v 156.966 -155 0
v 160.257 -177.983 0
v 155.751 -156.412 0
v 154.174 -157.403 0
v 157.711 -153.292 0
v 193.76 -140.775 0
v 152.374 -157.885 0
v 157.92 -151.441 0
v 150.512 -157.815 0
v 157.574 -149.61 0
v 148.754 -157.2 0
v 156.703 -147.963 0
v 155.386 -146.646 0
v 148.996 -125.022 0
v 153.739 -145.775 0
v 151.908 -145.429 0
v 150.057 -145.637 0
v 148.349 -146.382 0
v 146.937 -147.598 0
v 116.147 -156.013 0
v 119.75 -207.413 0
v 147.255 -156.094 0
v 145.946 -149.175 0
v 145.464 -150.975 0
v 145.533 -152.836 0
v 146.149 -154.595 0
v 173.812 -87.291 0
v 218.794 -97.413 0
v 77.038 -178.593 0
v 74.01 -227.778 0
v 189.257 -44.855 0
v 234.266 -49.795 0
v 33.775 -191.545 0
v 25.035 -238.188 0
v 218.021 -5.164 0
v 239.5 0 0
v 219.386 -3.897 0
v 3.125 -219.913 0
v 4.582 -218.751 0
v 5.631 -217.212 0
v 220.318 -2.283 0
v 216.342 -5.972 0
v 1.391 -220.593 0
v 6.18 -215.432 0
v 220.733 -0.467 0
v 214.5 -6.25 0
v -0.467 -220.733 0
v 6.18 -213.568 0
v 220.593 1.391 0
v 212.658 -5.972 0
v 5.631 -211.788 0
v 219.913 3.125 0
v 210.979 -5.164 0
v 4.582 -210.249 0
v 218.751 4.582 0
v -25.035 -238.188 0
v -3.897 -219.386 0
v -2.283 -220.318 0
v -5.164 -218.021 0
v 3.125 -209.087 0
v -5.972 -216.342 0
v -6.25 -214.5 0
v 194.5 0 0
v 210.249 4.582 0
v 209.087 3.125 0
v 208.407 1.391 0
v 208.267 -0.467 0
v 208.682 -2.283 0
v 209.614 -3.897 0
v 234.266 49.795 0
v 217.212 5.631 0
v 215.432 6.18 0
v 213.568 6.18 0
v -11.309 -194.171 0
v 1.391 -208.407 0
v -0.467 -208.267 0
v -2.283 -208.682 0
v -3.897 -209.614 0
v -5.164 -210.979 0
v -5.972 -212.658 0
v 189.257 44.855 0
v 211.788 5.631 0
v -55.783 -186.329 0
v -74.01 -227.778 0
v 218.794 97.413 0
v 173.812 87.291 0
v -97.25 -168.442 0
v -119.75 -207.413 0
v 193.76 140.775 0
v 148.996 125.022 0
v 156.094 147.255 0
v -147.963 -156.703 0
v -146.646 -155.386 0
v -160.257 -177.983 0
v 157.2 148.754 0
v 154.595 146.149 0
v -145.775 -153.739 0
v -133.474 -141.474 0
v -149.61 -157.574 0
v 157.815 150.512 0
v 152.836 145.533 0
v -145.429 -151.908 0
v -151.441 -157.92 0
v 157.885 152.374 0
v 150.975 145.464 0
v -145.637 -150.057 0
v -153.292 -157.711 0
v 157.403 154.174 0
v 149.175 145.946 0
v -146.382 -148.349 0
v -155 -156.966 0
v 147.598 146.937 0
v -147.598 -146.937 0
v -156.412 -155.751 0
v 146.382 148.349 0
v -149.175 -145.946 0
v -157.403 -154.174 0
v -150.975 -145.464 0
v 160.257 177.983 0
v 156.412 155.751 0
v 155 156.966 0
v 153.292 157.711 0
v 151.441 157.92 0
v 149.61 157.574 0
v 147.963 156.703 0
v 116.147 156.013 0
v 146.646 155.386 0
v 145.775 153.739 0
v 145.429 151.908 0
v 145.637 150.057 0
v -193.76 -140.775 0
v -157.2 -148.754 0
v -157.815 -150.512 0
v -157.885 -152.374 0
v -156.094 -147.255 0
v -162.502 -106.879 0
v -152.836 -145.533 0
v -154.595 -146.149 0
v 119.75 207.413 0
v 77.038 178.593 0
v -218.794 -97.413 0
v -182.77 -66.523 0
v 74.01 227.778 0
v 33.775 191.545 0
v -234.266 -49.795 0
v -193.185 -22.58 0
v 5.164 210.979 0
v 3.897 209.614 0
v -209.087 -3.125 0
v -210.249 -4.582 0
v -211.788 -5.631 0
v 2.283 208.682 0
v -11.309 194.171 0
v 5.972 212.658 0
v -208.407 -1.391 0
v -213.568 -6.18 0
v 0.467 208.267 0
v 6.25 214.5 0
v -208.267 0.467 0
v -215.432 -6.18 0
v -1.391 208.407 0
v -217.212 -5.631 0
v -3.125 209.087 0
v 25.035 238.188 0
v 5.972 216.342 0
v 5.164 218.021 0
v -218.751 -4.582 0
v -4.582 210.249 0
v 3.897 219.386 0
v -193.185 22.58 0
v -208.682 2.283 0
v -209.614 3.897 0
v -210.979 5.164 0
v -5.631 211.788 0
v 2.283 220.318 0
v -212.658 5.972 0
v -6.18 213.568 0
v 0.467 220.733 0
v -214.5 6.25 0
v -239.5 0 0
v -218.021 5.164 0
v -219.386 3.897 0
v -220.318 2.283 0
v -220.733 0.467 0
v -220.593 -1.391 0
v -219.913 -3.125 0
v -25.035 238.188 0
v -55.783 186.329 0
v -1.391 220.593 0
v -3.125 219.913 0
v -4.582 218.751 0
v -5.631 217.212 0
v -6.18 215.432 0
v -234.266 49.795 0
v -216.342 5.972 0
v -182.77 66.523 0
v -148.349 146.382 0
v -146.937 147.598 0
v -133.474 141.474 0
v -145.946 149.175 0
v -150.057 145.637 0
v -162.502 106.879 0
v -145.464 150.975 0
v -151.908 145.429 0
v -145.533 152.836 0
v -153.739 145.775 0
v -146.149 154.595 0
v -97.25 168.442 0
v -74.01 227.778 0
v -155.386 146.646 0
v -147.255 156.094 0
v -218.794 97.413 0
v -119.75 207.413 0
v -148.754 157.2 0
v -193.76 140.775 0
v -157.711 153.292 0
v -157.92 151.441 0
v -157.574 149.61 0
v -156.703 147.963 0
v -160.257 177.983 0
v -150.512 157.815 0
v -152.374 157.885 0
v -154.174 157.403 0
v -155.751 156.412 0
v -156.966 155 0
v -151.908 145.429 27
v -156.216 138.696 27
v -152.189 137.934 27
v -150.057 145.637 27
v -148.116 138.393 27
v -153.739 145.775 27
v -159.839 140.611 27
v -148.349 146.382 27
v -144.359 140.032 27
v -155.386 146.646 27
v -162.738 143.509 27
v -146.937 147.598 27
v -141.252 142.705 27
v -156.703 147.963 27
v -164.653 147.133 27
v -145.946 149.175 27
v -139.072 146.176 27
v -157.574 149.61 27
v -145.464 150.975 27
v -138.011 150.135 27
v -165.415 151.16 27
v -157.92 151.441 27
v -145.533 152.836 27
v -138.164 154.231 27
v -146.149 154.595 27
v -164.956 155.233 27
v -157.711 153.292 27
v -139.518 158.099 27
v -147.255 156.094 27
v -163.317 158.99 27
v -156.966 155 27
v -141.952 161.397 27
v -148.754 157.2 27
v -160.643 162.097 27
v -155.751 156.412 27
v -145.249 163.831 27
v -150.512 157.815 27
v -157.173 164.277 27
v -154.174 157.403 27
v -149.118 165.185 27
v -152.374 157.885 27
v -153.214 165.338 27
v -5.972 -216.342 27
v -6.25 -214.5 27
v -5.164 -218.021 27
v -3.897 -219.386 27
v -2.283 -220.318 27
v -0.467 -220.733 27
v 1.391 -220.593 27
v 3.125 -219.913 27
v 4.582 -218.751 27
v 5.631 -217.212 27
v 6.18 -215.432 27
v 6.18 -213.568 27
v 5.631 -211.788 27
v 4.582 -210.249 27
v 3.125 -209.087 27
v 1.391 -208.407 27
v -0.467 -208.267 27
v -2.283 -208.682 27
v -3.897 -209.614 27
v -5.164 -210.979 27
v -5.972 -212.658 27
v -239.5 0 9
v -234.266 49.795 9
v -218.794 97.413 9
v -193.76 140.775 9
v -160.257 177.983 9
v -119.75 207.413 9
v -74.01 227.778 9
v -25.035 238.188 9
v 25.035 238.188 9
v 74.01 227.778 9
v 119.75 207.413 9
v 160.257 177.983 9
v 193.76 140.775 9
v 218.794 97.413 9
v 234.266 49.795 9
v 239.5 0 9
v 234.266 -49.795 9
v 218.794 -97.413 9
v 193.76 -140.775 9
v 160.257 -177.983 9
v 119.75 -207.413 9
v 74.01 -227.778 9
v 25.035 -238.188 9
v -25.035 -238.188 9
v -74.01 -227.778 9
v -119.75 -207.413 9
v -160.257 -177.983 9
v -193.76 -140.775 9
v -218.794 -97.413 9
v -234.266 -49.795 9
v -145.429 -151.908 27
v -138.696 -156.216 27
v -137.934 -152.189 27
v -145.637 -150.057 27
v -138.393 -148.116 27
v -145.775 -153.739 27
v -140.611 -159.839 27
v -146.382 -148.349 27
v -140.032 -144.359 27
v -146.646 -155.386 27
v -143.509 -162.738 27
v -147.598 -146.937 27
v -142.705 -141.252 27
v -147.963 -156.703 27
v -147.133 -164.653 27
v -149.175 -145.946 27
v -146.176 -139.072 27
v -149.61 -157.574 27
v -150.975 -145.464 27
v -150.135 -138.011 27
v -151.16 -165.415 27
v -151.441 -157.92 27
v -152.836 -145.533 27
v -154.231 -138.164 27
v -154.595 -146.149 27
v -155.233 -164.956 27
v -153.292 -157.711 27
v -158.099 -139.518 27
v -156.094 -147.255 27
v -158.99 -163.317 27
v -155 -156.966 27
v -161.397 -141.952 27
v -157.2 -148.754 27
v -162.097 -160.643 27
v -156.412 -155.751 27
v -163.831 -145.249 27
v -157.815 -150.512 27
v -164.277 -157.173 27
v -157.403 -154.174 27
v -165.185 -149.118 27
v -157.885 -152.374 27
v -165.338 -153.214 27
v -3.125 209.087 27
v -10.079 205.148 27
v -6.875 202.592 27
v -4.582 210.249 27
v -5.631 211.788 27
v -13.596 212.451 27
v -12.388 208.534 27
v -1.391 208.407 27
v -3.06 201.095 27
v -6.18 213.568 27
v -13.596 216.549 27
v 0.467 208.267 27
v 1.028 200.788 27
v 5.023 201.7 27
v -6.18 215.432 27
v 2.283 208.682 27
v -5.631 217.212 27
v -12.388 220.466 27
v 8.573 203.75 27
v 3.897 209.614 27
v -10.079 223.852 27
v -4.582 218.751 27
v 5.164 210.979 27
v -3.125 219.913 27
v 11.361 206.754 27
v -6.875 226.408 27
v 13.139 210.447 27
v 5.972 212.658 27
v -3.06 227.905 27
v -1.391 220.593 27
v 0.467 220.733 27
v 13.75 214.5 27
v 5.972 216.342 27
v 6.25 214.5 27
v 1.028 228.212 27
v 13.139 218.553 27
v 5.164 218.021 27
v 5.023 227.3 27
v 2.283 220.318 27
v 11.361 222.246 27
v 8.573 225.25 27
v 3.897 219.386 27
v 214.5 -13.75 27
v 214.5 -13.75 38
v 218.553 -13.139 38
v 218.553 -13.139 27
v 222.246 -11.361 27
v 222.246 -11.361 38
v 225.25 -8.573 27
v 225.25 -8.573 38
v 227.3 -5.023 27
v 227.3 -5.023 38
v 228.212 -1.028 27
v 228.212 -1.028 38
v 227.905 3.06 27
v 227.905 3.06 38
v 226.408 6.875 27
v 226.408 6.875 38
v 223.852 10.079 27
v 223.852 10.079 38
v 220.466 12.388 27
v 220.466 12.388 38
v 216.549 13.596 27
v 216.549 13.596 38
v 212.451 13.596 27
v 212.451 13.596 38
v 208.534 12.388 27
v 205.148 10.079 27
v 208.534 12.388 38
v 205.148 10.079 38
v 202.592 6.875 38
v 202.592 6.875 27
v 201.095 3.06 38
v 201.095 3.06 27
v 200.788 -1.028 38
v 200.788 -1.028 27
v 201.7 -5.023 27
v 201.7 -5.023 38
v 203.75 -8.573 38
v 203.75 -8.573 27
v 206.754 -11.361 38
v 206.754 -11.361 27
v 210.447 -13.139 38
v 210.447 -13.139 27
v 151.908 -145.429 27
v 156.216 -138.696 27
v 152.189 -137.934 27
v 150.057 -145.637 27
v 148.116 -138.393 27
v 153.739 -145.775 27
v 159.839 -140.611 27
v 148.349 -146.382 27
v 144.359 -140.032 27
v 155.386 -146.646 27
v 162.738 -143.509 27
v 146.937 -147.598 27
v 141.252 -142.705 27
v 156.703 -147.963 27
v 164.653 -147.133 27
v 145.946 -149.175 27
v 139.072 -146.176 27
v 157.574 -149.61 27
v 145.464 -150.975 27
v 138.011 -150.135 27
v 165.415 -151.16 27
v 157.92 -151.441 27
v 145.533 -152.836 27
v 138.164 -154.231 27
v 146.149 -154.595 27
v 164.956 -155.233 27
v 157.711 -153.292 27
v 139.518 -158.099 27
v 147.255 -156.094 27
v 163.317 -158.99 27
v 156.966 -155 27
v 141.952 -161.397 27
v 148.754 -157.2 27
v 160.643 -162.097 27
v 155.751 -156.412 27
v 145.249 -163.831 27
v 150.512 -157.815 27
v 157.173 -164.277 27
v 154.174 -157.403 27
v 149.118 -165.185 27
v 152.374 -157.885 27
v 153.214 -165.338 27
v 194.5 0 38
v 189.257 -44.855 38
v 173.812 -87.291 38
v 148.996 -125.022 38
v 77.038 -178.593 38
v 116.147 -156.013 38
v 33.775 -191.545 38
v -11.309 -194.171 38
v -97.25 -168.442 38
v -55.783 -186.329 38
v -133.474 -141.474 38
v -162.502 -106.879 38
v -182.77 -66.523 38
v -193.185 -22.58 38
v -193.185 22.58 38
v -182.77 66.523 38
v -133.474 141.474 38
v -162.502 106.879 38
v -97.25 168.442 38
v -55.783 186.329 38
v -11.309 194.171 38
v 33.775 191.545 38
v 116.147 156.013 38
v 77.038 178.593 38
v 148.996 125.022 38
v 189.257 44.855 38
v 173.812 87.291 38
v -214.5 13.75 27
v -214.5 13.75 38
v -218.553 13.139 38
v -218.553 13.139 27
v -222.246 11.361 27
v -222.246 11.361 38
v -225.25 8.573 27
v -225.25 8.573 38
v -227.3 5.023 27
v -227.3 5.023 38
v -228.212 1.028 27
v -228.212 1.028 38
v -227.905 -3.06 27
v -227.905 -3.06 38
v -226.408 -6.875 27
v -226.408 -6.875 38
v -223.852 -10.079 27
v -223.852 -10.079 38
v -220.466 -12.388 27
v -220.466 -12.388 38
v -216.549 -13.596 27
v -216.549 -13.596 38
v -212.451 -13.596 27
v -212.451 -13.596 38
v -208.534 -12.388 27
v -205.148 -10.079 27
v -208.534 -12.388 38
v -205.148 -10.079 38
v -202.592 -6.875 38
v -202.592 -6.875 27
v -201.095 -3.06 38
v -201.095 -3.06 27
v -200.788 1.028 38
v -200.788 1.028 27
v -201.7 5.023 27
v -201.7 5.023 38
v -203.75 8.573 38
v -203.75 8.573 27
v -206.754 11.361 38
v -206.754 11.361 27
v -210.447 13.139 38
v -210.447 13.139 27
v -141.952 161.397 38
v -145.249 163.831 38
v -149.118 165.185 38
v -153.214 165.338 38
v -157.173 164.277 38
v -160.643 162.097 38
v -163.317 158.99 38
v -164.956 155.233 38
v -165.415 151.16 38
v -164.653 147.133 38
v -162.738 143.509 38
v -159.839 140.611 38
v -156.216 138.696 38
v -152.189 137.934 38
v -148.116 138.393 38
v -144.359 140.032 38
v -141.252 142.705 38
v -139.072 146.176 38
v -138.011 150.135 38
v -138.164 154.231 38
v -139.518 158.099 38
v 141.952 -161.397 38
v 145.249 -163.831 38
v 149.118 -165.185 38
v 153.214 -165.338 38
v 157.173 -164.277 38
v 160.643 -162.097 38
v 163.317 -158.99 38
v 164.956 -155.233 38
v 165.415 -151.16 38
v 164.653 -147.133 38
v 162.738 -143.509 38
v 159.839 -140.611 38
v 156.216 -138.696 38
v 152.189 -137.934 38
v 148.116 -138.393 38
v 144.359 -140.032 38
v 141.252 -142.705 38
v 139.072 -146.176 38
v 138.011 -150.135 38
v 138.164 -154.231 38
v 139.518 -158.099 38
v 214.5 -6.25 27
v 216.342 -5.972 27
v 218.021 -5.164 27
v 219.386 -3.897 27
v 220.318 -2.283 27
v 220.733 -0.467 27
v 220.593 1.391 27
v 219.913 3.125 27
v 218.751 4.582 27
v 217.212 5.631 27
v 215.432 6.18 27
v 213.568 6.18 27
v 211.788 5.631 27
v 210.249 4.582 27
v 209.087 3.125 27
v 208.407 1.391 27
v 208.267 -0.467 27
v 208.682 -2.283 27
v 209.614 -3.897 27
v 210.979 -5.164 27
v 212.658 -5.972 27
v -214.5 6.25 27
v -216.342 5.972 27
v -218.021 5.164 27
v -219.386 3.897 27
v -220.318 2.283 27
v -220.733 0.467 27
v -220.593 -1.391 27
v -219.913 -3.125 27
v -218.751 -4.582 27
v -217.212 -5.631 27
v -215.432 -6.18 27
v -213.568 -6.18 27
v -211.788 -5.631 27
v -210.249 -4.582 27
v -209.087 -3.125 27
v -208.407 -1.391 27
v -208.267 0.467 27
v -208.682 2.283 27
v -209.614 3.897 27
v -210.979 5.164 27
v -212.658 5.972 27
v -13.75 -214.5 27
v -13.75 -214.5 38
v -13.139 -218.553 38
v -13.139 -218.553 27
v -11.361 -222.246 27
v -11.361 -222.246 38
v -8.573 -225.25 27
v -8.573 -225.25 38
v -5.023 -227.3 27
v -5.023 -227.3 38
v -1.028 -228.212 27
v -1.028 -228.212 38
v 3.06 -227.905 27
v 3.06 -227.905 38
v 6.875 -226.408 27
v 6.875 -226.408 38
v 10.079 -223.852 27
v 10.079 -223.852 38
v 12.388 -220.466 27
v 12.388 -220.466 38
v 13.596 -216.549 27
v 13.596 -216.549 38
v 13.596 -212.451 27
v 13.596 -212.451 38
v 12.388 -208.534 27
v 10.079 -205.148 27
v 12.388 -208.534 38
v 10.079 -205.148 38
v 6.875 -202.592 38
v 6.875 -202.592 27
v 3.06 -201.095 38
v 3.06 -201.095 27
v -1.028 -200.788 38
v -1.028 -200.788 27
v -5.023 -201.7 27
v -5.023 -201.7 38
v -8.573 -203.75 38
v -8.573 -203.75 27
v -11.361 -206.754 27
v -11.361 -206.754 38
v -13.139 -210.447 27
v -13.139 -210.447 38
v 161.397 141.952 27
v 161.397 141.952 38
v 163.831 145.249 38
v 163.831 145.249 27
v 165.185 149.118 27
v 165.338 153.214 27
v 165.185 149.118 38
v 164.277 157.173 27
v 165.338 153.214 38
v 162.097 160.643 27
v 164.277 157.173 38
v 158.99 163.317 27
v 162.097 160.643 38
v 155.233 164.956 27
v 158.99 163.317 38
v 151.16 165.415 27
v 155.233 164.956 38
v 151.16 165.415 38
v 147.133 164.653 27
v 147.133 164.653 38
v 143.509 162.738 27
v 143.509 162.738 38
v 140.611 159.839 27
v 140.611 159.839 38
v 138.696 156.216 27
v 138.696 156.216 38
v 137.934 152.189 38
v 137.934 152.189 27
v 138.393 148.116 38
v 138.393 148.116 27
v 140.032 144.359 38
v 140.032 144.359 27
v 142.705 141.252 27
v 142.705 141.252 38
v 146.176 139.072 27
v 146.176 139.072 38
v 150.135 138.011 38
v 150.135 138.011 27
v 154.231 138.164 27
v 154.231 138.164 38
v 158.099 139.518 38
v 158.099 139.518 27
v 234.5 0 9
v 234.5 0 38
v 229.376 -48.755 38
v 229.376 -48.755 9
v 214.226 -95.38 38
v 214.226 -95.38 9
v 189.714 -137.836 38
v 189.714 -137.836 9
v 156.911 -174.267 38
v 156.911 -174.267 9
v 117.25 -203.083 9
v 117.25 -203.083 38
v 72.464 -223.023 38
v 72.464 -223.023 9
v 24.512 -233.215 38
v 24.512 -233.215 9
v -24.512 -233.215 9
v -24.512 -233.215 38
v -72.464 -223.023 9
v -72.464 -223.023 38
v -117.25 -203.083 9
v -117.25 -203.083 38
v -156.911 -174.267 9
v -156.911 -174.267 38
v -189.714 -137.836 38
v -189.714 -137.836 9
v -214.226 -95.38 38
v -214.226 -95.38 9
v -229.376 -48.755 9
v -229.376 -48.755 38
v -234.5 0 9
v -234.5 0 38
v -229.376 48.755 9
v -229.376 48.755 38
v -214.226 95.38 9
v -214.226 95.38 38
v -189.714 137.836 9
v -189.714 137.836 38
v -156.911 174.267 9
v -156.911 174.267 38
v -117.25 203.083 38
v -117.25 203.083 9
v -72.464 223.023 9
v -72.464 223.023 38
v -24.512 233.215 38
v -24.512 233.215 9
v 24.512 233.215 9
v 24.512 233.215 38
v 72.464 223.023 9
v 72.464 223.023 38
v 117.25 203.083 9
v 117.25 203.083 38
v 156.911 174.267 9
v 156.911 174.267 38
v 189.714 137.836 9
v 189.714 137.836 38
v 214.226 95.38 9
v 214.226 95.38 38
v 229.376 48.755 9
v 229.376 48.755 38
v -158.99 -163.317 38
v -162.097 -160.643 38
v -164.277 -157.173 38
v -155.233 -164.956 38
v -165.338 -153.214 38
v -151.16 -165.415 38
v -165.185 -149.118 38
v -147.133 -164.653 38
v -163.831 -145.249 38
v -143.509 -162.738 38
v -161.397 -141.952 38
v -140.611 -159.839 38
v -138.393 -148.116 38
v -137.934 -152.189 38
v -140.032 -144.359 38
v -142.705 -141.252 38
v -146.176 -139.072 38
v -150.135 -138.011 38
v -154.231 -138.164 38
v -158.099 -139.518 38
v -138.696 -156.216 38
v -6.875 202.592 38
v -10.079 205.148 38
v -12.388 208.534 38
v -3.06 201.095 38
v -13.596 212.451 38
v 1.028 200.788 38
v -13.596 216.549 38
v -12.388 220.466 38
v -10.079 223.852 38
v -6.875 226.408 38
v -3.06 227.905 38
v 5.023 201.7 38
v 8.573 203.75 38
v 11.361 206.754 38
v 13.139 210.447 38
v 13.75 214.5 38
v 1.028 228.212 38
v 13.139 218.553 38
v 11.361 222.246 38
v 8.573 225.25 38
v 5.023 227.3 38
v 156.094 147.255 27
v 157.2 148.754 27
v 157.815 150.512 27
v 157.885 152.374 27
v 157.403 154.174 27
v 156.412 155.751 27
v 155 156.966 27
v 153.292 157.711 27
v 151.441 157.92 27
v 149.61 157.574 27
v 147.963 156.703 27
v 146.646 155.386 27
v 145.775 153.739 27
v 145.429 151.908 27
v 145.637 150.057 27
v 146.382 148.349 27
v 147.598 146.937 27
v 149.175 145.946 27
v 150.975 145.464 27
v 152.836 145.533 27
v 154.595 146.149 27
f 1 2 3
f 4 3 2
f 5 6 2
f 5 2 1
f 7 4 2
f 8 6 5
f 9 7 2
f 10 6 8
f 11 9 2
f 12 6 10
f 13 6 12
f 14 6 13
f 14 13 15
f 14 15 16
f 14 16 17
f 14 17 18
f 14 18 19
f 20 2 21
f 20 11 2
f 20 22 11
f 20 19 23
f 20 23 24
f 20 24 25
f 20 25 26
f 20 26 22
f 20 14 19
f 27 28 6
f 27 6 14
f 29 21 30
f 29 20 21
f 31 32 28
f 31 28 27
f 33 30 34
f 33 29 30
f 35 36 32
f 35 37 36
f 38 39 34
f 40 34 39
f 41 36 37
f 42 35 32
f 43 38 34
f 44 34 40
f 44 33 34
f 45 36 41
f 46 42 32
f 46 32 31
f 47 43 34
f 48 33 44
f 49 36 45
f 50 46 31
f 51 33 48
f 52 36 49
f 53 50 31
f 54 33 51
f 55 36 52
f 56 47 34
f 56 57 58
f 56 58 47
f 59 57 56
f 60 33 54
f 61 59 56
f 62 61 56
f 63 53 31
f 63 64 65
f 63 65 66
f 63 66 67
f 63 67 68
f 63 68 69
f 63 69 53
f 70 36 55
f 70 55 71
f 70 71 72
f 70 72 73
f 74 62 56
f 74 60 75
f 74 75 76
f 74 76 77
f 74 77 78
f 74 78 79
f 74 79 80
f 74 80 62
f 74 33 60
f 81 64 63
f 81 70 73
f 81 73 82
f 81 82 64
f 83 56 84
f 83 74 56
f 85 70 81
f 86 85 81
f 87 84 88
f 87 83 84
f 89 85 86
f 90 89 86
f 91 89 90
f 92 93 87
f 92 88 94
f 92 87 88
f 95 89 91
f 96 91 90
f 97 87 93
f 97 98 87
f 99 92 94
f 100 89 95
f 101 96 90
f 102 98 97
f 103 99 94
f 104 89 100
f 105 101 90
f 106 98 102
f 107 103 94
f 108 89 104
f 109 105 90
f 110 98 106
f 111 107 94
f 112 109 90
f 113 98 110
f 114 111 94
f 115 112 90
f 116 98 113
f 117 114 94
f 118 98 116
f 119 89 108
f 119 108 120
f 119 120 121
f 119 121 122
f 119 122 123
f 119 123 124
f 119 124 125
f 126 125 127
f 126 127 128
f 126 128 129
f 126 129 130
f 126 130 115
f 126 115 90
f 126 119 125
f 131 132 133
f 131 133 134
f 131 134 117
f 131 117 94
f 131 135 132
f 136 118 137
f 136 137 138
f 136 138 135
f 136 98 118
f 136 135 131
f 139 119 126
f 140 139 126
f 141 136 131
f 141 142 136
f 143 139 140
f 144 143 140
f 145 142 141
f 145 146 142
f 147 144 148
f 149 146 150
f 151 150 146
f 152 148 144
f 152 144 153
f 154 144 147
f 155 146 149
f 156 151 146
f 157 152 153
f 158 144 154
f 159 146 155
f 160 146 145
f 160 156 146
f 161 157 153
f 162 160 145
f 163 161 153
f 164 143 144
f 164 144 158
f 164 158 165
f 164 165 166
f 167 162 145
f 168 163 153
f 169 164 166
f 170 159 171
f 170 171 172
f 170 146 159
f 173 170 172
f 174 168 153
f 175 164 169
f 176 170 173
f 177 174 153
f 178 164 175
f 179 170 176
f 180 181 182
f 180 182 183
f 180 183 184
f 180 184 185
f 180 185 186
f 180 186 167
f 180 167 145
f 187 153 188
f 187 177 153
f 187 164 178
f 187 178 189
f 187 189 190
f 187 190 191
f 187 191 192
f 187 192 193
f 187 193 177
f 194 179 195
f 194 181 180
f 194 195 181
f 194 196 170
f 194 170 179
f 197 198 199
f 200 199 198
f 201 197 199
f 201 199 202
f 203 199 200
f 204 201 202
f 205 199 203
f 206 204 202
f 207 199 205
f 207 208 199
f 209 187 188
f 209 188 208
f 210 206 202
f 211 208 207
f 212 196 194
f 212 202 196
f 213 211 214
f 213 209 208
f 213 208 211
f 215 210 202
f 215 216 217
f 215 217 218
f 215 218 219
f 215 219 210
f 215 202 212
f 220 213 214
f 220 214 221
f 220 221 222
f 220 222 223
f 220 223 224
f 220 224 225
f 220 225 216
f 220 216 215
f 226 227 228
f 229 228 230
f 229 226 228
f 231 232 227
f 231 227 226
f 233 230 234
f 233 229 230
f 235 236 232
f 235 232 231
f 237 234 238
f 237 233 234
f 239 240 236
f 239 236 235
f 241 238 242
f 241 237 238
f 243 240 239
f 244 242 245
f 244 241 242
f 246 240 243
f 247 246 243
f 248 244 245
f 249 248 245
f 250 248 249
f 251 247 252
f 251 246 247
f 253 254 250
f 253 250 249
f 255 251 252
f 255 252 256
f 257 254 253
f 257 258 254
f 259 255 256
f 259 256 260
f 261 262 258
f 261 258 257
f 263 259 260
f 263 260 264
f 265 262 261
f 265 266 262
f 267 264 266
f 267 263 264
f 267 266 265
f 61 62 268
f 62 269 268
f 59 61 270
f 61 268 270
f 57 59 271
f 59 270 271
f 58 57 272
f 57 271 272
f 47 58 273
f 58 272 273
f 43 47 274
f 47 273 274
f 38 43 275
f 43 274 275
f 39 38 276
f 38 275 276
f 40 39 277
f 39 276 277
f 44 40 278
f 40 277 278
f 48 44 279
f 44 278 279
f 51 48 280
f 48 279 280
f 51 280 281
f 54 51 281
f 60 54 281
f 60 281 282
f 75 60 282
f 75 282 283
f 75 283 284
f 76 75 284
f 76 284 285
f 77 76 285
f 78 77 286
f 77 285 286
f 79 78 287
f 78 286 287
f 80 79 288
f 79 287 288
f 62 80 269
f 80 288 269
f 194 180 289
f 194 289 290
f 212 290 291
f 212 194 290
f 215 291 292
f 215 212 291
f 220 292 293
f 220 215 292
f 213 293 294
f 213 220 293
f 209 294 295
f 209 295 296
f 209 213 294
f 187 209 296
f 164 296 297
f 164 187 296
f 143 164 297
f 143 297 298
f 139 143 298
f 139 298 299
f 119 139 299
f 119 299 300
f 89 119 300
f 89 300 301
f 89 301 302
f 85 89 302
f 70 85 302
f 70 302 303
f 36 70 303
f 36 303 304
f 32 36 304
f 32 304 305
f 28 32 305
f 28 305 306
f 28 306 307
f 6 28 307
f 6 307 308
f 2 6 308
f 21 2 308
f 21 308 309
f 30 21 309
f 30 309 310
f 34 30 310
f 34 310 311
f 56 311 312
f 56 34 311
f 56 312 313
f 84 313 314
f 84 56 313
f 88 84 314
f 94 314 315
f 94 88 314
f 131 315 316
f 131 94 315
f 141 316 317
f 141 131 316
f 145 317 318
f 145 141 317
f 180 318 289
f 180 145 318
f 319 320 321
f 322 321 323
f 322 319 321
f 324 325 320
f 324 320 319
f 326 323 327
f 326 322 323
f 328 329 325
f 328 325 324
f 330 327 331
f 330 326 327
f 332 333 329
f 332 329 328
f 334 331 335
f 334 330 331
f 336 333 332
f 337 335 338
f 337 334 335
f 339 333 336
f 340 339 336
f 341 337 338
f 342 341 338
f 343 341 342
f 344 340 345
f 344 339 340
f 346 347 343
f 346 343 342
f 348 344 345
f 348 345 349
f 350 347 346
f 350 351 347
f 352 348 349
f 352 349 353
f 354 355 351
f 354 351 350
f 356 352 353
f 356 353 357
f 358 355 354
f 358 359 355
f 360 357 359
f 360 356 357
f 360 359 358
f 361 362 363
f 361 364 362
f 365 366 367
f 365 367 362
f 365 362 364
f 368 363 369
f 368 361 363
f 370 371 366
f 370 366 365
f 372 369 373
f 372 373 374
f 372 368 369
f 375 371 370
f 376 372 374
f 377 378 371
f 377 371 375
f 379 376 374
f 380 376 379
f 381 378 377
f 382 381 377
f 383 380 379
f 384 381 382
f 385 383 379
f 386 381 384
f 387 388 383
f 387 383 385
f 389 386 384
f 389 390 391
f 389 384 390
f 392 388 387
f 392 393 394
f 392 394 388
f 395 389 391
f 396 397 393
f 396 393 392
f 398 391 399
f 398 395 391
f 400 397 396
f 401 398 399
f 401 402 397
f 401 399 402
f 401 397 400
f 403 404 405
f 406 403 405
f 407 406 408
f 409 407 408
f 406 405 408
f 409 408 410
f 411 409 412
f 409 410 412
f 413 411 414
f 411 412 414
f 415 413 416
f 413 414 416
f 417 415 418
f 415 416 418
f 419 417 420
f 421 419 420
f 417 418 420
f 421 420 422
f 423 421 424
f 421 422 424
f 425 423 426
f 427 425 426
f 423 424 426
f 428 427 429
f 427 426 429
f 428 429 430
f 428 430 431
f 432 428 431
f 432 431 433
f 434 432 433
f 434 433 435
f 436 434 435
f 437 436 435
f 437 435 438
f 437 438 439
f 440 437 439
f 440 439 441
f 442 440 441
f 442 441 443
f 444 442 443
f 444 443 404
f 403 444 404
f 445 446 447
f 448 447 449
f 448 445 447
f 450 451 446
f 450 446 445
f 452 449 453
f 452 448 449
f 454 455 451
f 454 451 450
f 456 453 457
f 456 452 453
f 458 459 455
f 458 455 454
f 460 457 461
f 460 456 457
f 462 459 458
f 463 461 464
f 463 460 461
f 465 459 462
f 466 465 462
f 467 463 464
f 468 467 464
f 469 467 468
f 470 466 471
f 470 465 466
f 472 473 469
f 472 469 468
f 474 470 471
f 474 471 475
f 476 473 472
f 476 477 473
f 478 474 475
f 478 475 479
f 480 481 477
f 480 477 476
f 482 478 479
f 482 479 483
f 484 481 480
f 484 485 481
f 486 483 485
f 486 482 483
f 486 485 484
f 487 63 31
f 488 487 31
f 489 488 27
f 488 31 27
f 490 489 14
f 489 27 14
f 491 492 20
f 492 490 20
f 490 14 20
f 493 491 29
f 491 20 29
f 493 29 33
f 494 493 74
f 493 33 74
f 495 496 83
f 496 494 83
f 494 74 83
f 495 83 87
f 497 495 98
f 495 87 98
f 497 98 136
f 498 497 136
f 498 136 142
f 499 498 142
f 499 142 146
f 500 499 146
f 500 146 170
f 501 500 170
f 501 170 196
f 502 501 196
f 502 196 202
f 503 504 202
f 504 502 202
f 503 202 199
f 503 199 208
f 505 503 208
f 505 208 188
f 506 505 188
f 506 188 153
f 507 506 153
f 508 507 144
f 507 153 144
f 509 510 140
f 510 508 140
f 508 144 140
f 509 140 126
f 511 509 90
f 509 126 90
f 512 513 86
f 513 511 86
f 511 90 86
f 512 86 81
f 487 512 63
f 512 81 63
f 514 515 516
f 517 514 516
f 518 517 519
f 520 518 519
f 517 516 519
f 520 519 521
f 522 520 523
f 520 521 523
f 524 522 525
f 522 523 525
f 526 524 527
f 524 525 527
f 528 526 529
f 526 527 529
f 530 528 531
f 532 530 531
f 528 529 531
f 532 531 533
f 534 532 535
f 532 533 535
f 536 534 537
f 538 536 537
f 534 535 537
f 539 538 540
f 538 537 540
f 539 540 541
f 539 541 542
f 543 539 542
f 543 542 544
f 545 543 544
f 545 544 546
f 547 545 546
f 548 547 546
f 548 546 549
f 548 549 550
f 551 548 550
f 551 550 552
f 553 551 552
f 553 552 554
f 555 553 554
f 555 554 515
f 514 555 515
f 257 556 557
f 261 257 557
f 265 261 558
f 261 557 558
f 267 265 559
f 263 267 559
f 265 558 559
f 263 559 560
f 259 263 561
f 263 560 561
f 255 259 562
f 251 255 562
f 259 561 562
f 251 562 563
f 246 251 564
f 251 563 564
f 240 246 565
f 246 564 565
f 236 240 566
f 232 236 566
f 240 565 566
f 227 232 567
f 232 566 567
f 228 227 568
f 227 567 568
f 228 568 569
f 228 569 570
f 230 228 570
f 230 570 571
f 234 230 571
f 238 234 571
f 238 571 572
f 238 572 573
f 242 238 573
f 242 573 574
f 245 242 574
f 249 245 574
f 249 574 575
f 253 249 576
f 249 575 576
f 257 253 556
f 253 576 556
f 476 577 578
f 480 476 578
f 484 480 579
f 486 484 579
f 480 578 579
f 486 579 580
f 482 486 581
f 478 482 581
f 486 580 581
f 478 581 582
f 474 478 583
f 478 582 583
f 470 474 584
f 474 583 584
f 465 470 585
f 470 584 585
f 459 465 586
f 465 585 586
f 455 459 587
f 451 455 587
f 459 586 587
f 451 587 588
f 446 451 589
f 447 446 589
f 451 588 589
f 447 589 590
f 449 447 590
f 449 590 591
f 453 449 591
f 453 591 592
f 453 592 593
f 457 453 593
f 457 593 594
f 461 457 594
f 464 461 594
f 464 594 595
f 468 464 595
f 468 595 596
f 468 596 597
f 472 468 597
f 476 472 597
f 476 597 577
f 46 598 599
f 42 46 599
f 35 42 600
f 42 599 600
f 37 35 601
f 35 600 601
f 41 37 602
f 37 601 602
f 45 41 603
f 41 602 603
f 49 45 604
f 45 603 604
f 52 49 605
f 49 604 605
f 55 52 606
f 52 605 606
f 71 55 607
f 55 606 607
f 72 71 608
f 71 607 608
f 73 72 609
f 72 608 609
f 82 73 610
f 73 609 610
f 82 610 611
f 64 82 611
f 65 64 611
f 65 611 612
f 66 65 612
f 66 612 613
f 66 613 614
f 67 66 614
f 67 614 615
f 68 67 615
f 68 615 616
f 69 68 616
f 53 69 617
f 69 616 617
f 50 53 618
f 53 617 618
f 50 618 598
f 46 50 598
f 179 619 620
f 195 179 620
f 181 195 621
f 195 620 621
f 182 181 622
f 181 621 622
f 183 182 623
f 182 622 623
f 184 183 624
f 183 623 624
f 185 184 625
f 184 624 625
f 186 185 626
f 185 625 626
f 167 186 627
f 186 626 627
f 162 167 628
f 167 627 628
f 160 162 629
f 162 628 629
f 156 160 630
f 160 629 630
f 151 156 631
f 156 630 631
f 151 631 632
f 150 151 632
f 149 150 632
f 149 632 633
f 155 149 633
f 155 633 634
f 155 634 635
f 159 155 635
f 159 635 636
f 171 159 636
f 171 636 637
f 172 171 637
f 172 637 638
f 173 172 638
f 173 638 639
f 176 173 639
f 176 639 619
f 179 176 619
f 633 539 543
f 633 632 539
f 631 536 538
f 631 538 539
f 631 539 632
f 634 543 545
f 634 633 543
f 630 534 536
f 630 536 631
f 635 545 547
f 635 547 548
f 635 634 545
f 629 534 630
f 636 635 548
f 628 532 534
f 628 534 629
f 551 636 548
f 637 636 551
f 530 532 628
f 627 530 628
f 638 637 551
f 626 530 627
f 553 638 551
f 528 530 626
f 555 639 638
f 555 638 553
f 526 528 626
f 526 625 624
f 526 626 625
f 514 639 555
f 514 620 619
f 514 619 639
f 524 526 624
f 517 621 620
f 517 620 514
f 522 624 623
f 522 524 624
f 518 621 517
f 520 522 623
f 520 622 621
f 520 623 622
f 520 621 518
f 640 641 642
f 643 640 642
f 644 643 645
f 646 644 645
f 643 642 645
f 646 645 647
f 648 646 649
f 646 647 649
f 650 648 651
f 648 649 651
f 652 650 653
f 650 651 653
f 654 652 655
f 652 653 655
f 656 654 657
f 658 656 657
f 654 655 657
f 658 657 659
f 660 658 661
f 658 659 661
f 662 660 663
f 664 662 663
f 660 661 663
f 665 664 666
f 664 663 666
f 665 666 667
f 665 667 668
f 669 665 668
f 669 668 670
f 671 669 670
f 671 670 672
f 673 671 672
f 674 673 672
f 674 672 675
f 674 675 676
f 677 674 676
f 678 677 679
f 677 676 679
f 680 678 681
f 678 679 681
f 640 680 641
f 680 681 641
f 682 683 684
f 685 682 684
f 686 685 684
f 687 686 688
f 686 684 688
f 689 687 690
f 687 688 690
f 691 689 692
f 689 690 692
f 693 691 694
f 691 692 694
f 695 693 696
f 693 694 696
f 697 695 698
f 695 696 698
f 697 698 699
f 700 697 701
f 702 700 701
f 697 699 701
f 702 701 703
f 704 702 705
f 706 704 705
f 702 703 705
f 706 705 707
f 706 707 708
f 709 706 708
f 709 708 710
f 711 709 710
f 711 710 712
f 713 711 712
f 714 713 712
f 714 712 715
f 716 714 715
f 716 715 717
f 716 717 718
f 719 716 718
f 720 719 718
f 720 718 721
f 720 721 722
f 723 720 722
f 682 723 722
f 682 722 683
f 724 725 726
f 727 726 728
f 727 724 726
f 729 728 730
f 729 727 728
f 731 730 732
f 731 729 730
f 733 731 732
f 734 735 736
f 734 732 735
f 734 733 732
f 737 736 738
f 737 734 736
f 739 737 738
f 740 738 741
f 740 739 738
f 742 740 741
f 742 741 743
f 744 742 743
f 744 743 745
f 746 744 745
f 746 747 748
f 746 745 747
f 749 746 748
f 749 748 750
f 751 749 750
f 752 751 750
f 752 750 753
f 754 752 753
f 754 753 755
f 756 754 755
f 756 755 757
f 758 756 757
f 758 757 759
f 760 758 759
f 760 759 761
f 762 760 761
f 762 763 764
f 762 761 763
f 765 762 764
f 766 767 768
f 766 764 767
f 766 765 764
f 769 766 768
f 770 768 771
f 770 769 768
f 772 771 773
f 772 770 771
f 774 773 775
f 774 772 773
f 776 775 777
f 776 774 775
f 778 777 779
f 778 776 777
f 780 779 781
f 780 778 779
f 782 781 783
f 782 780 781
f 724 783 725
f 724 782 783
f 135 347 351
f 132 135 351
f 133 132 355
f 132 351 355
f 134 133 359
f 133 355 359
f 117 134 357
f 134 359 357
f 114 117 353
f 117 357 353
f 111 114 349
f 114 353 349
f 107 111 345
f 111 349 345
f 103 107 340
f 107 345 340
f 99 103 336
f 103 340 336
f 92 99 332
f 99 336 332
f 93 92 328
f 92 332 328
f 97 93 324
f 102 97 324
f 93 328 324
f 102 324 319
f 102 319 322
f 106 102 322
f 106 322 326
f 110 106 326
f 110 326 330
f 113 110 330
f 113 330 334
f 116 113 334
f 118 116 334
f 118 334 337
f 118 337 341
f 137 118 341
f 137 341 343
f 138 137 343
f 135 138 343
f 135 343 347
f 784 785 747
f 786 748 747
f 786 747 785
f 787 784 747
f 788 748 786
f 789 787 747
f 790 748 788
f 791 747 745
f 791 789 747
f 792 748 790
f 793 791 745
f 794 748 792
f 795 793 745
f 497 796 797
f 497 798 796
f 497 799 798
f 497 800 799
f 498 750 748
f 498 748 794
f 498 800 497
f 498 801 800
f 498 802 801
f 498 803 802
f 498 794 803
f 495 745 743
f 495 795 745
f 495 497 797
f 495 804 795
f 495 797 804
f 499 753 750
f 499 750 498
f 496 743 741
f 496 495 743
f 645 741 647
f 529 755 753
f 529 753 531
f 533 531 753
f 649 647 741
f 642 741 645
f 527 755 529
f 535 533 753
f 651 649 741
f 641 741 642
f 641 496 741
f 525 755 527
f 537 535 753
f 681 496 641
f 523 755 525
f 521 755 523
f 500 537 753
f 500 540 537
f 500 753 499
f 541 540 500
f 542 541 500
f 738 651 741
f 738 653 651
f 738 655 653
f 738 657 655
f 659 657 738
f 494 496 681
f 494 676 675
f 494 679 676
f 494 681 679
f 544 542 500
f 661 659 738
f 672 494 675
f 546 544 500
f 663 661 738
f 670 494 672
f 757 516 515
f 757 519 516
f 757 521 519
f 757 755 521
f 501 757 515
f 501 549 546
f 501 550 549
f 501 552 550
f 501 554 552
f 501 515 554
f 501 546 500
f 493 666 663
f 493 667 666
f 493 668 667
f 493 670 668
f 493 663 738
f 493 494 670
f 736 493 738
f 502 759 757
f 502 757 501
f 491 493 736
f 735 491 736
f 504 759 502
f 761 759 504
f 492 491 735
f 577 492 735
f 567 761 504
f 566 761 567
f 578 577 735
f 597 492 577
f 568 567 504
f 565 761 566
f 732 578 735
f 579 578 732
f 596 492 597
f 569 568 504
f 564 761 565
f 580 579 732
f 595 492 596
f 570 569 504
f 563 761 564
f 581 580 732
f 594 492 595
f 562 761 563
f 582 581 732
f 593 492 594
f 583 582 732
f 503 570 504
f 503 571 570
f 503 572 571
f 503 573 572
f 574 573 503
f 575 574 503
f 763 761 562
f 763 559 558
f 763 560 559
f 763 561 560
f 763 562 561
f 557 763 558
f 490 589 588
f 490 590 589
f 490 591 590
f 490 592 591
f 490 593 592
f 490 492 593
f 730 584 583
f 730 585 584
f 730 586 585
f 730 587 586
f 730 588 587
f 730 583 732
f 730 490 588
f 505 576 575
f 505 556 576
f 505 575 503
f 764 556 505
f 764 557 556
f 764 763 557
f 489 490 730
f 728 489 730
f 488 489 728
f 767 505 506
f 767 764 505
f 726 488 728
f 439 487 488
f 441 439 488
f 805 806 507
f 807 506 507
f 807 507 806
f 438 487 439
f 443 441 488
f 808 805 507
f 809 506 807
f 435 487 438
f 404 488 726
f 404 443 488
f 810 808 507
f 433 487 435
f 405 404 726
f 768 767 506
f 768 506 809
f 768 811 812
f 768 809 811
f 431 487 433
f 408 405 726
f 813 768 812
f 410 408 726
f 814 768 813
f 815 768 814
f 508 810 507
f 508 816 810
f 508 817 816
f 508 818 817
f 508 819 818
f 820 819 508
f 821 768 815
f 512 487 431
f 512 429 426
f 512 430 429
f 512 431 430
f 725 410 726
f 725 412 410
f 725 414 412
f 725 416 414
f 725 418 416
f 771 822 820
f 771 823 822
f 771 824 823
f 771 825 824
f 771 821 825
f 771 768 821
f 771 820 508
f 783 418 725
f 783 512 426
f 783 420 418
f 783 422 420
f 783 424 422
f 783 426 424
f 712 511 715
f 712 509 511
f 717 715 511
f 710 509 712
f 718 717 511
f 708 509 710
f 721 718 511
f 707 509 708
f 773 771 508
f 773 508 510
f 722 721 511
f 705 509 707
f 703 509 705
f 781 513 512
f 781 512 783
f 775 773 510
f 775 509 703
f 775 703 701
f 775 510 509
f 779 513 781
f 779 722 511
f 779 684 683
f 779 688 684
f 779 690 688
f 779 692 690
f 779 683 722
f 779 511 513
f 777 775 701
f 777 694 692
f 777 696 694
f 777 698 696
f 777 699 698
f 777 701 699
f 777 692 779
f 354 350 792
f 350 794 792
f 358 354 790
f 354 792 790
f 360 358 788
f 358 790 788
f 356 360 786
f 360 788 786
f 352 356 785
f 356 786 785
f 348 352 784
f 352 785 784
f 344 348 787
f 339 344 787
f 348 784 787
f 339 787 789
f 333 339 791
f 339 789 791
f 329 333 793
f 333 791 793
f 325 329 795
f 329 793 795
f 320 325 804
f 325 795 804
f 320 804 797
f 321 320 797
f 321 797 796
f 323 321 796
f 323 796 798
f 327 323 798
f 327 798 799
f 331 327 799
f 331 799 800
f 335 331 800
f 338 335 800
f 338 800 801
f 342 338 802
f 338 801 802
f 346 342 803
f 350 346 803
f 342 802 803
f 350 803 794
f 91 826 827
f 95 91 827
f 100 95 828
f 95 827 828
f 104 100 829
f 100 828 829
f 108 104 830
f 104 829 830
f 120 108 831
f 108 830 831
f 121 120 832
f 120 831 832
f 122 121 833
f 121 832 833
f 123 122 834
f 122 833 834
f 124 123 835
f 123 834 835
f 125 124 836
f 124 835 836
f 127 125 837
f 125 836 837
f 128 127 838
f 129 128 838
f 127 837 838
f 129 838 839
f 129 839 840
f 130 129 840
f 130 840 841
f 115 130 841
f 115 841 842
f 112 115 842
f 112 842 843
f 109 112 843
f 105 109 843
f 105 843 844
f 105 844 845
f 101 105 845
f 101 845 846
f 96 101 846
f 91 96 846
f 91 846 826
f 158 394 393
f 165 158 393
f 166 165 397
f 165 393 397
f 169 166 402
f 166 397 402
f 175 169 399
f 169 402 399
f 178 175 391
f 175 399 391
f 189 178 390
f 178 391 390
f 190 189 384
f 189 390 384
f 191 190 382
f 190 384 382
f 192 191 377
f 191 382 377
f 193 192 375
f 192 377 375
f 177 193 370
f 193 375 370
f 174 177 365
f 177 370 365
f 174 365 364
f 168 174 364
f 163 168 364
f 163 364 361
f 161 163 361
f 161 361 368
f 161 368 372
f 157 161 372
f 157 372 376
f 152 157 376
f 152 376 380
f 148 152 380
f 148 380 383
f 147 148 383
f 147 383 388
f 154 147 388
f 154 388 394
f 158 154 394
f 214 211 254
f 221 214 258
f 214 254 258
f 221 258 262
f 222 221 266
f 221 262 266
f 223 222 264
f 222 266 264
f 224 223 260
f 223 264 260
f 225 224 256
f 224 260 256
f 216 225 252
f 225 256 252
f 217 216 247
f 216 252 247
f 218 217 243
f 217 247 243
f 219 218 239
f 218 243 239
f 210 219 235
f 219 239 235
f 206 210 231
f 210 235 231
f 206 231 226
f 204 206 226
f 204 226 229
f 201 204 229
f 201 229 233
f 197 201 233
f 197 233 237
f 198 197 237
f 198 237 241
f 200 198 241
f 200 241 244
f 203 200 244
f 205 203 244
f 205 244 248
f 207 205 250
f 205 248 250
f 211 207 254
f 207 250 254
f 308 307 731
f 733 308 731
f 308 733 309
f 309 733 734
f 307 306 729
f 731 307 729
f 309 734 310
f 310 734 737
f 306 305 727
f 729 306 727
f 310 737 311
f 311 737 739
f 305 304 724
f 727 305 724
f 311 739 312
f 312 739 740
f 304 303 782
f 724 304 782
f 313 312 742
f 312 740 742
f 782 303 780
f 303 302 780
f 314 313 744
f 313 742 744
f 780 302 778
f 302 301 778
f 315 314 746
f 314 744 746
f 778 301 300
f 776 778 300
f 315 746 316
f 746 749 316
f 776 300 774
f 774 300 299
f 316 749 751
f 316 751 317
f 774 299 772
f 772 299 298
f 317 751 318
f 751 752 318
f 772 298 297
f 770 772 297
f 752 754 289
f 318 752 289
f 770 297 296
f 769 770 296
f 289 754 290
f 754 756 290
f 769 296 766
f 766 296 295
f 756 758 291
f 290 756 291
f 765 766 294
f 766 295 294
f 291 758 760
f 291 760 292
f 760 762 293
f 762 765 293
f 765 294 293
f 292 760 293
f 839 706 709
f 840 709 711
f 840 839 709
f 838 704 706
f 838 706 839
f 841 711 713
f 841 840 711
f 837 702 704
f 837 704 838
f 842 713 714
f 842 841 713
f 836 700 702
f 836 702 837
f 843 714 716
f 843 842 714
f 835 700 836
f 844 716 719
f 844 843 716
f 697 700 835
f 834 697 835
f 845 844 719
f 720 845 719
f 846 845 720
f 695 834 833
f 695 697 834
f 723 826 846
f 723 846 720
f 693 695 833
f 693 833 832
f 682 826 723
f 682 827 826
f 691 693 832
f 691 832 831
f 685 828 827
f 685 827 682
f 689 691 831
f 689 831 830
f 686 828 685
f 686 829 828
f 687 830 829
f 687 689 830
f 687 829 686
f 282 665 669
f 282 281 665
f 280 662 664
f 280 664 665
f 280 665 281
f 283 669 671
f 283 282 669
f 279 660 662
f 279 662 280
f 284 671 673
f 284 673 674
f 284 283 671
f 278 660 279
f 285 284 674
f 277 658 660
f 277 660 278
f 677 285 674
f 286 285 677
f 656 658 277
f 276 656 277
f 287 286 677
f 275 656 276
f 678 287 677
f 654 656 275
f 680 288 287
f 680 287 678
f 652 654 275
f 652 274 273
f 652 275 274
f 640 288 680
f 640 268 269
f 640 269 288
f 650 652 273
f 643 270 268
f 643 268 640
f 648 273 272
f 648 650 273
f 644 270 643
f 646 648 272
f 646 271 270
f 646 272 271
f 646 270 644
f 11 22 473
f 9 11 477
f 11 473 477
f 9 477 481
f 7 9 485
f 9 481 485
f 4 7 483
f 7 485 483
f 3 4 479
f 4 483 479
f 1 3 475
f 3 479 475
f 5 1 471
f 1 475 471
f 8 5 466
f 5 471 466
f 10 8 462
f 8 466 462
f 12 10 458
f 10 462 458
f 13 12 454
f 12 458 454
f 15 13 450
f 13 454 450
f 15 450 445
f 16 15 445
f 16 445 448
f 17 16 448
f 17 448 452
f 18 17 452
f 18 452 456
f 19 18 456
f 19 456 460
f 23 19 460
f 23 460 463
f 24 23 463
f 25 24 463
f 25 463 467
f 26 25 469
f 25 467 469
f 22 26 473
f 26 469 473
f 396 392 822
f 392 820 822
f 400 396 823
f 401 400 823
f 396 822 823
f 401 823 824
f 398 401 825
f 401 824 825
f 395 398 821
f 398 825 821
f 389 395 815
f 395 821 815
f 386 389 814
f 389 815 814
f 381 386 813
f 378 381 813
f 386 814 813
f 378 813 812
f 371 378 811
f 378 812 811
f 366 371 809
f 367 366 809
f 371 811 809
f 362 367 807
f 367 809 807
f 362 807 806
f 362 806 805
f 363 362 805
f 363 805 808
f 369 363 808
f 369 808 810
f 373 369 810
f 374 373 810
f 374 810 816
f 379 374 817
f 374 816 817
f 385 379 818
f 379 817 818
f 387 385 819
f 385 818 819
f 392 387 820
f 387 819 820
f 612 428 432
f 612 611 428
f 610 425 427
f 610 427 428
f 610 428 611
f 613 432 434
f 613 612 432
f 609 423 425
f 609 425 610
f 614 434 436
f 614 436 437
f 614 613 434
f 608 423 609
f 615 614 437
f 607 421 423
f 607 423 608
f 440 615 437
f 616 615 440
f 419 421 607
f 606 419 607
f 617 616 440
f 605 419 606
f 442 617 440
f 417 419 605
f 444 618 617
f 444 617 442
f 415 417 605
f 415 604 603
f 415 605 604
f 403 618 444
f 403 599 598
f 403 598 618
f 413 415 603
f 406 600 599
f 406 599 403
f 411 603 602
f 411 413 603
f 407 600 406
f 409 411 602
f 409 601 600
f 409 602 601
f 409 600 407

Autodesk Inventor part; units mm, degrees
ref_plane "YZ Plane" through (0, 0, 0) normal (1, 0, 0) x (0, 1, 0)
ref_plane "XZ Plane" through (0, 0, 0) normal (0, 1, 0) x (-1, 0, 0)
ref_plane "XY Plane" through (0, 0, 0) normal (0, 0, 1) x (1, 0, 0)
sketch "Sketch1" plane through (0, 0, 0) normal (0, 0, 1) x (1, 0, 0)
  circle A0 centre (0, 0) radius 194.5
  circle A1 centre (0, 0) radius 234.5
  dimension "d0" = 40
  dimension "d1" = 389
extrude "Extrusion1" add sketch "Sketch1" along normal blind 38
sketch "Sketch2" plane through (0, 0, 38) normal (0, 0, 1) x (1, 0, 0)
  circle A0 centre (0, 0) radius 234.5 construction
  circle A1 centre (0, 0) radius 194.5 construction
  line L0 (0, 234.5) -> (0, 194.5) construction
  circle A2 centre (0, 214.5) radius 6.25
  dimension "d4" = 12.5
extrude "Extrusion2" cut sketch "Sketch2" against normal through all
sketch "Sketch3" plane through (0, 0, 38) normal (0, 0, 1) x (1, 0, 0)
  circle A0 centre (0, 214.5) radius 6.25 projected
  circle A1 centre (0, 214.5) radius 13.75
  point P0 (0, 0)
  dimension "d10" = 27.5
extrude "Extrusion3" cut sketch "Sketch3" against normal blind 11
pattern_circular "Circular Pattern1" count 8 over 360 about axis through (0, 0, 0) along (0, 0, 1) of "Extrusion2", "Extrusion3"
sketch "Sketch4" plane through (0, 0, 0) normal (0, 0, -1) x (-1, 0, 0)
  circle A0 centre (0, 0) radius 234.5 projected
  circle A1 centre (0, 0) radius 239.5
  dimension "d13" = 5
extrude "Extrusion4" add sketch "Sketch4" against normal blind 9
equation "\"d1\" = Вал_ось_диаметр_КОРМА"
equation "\"Вал_ось_диаметр_КОРМА\" = 389"
properties part number "ДМФ 01 32 Барабан Опорное кольцо КОРМА"
